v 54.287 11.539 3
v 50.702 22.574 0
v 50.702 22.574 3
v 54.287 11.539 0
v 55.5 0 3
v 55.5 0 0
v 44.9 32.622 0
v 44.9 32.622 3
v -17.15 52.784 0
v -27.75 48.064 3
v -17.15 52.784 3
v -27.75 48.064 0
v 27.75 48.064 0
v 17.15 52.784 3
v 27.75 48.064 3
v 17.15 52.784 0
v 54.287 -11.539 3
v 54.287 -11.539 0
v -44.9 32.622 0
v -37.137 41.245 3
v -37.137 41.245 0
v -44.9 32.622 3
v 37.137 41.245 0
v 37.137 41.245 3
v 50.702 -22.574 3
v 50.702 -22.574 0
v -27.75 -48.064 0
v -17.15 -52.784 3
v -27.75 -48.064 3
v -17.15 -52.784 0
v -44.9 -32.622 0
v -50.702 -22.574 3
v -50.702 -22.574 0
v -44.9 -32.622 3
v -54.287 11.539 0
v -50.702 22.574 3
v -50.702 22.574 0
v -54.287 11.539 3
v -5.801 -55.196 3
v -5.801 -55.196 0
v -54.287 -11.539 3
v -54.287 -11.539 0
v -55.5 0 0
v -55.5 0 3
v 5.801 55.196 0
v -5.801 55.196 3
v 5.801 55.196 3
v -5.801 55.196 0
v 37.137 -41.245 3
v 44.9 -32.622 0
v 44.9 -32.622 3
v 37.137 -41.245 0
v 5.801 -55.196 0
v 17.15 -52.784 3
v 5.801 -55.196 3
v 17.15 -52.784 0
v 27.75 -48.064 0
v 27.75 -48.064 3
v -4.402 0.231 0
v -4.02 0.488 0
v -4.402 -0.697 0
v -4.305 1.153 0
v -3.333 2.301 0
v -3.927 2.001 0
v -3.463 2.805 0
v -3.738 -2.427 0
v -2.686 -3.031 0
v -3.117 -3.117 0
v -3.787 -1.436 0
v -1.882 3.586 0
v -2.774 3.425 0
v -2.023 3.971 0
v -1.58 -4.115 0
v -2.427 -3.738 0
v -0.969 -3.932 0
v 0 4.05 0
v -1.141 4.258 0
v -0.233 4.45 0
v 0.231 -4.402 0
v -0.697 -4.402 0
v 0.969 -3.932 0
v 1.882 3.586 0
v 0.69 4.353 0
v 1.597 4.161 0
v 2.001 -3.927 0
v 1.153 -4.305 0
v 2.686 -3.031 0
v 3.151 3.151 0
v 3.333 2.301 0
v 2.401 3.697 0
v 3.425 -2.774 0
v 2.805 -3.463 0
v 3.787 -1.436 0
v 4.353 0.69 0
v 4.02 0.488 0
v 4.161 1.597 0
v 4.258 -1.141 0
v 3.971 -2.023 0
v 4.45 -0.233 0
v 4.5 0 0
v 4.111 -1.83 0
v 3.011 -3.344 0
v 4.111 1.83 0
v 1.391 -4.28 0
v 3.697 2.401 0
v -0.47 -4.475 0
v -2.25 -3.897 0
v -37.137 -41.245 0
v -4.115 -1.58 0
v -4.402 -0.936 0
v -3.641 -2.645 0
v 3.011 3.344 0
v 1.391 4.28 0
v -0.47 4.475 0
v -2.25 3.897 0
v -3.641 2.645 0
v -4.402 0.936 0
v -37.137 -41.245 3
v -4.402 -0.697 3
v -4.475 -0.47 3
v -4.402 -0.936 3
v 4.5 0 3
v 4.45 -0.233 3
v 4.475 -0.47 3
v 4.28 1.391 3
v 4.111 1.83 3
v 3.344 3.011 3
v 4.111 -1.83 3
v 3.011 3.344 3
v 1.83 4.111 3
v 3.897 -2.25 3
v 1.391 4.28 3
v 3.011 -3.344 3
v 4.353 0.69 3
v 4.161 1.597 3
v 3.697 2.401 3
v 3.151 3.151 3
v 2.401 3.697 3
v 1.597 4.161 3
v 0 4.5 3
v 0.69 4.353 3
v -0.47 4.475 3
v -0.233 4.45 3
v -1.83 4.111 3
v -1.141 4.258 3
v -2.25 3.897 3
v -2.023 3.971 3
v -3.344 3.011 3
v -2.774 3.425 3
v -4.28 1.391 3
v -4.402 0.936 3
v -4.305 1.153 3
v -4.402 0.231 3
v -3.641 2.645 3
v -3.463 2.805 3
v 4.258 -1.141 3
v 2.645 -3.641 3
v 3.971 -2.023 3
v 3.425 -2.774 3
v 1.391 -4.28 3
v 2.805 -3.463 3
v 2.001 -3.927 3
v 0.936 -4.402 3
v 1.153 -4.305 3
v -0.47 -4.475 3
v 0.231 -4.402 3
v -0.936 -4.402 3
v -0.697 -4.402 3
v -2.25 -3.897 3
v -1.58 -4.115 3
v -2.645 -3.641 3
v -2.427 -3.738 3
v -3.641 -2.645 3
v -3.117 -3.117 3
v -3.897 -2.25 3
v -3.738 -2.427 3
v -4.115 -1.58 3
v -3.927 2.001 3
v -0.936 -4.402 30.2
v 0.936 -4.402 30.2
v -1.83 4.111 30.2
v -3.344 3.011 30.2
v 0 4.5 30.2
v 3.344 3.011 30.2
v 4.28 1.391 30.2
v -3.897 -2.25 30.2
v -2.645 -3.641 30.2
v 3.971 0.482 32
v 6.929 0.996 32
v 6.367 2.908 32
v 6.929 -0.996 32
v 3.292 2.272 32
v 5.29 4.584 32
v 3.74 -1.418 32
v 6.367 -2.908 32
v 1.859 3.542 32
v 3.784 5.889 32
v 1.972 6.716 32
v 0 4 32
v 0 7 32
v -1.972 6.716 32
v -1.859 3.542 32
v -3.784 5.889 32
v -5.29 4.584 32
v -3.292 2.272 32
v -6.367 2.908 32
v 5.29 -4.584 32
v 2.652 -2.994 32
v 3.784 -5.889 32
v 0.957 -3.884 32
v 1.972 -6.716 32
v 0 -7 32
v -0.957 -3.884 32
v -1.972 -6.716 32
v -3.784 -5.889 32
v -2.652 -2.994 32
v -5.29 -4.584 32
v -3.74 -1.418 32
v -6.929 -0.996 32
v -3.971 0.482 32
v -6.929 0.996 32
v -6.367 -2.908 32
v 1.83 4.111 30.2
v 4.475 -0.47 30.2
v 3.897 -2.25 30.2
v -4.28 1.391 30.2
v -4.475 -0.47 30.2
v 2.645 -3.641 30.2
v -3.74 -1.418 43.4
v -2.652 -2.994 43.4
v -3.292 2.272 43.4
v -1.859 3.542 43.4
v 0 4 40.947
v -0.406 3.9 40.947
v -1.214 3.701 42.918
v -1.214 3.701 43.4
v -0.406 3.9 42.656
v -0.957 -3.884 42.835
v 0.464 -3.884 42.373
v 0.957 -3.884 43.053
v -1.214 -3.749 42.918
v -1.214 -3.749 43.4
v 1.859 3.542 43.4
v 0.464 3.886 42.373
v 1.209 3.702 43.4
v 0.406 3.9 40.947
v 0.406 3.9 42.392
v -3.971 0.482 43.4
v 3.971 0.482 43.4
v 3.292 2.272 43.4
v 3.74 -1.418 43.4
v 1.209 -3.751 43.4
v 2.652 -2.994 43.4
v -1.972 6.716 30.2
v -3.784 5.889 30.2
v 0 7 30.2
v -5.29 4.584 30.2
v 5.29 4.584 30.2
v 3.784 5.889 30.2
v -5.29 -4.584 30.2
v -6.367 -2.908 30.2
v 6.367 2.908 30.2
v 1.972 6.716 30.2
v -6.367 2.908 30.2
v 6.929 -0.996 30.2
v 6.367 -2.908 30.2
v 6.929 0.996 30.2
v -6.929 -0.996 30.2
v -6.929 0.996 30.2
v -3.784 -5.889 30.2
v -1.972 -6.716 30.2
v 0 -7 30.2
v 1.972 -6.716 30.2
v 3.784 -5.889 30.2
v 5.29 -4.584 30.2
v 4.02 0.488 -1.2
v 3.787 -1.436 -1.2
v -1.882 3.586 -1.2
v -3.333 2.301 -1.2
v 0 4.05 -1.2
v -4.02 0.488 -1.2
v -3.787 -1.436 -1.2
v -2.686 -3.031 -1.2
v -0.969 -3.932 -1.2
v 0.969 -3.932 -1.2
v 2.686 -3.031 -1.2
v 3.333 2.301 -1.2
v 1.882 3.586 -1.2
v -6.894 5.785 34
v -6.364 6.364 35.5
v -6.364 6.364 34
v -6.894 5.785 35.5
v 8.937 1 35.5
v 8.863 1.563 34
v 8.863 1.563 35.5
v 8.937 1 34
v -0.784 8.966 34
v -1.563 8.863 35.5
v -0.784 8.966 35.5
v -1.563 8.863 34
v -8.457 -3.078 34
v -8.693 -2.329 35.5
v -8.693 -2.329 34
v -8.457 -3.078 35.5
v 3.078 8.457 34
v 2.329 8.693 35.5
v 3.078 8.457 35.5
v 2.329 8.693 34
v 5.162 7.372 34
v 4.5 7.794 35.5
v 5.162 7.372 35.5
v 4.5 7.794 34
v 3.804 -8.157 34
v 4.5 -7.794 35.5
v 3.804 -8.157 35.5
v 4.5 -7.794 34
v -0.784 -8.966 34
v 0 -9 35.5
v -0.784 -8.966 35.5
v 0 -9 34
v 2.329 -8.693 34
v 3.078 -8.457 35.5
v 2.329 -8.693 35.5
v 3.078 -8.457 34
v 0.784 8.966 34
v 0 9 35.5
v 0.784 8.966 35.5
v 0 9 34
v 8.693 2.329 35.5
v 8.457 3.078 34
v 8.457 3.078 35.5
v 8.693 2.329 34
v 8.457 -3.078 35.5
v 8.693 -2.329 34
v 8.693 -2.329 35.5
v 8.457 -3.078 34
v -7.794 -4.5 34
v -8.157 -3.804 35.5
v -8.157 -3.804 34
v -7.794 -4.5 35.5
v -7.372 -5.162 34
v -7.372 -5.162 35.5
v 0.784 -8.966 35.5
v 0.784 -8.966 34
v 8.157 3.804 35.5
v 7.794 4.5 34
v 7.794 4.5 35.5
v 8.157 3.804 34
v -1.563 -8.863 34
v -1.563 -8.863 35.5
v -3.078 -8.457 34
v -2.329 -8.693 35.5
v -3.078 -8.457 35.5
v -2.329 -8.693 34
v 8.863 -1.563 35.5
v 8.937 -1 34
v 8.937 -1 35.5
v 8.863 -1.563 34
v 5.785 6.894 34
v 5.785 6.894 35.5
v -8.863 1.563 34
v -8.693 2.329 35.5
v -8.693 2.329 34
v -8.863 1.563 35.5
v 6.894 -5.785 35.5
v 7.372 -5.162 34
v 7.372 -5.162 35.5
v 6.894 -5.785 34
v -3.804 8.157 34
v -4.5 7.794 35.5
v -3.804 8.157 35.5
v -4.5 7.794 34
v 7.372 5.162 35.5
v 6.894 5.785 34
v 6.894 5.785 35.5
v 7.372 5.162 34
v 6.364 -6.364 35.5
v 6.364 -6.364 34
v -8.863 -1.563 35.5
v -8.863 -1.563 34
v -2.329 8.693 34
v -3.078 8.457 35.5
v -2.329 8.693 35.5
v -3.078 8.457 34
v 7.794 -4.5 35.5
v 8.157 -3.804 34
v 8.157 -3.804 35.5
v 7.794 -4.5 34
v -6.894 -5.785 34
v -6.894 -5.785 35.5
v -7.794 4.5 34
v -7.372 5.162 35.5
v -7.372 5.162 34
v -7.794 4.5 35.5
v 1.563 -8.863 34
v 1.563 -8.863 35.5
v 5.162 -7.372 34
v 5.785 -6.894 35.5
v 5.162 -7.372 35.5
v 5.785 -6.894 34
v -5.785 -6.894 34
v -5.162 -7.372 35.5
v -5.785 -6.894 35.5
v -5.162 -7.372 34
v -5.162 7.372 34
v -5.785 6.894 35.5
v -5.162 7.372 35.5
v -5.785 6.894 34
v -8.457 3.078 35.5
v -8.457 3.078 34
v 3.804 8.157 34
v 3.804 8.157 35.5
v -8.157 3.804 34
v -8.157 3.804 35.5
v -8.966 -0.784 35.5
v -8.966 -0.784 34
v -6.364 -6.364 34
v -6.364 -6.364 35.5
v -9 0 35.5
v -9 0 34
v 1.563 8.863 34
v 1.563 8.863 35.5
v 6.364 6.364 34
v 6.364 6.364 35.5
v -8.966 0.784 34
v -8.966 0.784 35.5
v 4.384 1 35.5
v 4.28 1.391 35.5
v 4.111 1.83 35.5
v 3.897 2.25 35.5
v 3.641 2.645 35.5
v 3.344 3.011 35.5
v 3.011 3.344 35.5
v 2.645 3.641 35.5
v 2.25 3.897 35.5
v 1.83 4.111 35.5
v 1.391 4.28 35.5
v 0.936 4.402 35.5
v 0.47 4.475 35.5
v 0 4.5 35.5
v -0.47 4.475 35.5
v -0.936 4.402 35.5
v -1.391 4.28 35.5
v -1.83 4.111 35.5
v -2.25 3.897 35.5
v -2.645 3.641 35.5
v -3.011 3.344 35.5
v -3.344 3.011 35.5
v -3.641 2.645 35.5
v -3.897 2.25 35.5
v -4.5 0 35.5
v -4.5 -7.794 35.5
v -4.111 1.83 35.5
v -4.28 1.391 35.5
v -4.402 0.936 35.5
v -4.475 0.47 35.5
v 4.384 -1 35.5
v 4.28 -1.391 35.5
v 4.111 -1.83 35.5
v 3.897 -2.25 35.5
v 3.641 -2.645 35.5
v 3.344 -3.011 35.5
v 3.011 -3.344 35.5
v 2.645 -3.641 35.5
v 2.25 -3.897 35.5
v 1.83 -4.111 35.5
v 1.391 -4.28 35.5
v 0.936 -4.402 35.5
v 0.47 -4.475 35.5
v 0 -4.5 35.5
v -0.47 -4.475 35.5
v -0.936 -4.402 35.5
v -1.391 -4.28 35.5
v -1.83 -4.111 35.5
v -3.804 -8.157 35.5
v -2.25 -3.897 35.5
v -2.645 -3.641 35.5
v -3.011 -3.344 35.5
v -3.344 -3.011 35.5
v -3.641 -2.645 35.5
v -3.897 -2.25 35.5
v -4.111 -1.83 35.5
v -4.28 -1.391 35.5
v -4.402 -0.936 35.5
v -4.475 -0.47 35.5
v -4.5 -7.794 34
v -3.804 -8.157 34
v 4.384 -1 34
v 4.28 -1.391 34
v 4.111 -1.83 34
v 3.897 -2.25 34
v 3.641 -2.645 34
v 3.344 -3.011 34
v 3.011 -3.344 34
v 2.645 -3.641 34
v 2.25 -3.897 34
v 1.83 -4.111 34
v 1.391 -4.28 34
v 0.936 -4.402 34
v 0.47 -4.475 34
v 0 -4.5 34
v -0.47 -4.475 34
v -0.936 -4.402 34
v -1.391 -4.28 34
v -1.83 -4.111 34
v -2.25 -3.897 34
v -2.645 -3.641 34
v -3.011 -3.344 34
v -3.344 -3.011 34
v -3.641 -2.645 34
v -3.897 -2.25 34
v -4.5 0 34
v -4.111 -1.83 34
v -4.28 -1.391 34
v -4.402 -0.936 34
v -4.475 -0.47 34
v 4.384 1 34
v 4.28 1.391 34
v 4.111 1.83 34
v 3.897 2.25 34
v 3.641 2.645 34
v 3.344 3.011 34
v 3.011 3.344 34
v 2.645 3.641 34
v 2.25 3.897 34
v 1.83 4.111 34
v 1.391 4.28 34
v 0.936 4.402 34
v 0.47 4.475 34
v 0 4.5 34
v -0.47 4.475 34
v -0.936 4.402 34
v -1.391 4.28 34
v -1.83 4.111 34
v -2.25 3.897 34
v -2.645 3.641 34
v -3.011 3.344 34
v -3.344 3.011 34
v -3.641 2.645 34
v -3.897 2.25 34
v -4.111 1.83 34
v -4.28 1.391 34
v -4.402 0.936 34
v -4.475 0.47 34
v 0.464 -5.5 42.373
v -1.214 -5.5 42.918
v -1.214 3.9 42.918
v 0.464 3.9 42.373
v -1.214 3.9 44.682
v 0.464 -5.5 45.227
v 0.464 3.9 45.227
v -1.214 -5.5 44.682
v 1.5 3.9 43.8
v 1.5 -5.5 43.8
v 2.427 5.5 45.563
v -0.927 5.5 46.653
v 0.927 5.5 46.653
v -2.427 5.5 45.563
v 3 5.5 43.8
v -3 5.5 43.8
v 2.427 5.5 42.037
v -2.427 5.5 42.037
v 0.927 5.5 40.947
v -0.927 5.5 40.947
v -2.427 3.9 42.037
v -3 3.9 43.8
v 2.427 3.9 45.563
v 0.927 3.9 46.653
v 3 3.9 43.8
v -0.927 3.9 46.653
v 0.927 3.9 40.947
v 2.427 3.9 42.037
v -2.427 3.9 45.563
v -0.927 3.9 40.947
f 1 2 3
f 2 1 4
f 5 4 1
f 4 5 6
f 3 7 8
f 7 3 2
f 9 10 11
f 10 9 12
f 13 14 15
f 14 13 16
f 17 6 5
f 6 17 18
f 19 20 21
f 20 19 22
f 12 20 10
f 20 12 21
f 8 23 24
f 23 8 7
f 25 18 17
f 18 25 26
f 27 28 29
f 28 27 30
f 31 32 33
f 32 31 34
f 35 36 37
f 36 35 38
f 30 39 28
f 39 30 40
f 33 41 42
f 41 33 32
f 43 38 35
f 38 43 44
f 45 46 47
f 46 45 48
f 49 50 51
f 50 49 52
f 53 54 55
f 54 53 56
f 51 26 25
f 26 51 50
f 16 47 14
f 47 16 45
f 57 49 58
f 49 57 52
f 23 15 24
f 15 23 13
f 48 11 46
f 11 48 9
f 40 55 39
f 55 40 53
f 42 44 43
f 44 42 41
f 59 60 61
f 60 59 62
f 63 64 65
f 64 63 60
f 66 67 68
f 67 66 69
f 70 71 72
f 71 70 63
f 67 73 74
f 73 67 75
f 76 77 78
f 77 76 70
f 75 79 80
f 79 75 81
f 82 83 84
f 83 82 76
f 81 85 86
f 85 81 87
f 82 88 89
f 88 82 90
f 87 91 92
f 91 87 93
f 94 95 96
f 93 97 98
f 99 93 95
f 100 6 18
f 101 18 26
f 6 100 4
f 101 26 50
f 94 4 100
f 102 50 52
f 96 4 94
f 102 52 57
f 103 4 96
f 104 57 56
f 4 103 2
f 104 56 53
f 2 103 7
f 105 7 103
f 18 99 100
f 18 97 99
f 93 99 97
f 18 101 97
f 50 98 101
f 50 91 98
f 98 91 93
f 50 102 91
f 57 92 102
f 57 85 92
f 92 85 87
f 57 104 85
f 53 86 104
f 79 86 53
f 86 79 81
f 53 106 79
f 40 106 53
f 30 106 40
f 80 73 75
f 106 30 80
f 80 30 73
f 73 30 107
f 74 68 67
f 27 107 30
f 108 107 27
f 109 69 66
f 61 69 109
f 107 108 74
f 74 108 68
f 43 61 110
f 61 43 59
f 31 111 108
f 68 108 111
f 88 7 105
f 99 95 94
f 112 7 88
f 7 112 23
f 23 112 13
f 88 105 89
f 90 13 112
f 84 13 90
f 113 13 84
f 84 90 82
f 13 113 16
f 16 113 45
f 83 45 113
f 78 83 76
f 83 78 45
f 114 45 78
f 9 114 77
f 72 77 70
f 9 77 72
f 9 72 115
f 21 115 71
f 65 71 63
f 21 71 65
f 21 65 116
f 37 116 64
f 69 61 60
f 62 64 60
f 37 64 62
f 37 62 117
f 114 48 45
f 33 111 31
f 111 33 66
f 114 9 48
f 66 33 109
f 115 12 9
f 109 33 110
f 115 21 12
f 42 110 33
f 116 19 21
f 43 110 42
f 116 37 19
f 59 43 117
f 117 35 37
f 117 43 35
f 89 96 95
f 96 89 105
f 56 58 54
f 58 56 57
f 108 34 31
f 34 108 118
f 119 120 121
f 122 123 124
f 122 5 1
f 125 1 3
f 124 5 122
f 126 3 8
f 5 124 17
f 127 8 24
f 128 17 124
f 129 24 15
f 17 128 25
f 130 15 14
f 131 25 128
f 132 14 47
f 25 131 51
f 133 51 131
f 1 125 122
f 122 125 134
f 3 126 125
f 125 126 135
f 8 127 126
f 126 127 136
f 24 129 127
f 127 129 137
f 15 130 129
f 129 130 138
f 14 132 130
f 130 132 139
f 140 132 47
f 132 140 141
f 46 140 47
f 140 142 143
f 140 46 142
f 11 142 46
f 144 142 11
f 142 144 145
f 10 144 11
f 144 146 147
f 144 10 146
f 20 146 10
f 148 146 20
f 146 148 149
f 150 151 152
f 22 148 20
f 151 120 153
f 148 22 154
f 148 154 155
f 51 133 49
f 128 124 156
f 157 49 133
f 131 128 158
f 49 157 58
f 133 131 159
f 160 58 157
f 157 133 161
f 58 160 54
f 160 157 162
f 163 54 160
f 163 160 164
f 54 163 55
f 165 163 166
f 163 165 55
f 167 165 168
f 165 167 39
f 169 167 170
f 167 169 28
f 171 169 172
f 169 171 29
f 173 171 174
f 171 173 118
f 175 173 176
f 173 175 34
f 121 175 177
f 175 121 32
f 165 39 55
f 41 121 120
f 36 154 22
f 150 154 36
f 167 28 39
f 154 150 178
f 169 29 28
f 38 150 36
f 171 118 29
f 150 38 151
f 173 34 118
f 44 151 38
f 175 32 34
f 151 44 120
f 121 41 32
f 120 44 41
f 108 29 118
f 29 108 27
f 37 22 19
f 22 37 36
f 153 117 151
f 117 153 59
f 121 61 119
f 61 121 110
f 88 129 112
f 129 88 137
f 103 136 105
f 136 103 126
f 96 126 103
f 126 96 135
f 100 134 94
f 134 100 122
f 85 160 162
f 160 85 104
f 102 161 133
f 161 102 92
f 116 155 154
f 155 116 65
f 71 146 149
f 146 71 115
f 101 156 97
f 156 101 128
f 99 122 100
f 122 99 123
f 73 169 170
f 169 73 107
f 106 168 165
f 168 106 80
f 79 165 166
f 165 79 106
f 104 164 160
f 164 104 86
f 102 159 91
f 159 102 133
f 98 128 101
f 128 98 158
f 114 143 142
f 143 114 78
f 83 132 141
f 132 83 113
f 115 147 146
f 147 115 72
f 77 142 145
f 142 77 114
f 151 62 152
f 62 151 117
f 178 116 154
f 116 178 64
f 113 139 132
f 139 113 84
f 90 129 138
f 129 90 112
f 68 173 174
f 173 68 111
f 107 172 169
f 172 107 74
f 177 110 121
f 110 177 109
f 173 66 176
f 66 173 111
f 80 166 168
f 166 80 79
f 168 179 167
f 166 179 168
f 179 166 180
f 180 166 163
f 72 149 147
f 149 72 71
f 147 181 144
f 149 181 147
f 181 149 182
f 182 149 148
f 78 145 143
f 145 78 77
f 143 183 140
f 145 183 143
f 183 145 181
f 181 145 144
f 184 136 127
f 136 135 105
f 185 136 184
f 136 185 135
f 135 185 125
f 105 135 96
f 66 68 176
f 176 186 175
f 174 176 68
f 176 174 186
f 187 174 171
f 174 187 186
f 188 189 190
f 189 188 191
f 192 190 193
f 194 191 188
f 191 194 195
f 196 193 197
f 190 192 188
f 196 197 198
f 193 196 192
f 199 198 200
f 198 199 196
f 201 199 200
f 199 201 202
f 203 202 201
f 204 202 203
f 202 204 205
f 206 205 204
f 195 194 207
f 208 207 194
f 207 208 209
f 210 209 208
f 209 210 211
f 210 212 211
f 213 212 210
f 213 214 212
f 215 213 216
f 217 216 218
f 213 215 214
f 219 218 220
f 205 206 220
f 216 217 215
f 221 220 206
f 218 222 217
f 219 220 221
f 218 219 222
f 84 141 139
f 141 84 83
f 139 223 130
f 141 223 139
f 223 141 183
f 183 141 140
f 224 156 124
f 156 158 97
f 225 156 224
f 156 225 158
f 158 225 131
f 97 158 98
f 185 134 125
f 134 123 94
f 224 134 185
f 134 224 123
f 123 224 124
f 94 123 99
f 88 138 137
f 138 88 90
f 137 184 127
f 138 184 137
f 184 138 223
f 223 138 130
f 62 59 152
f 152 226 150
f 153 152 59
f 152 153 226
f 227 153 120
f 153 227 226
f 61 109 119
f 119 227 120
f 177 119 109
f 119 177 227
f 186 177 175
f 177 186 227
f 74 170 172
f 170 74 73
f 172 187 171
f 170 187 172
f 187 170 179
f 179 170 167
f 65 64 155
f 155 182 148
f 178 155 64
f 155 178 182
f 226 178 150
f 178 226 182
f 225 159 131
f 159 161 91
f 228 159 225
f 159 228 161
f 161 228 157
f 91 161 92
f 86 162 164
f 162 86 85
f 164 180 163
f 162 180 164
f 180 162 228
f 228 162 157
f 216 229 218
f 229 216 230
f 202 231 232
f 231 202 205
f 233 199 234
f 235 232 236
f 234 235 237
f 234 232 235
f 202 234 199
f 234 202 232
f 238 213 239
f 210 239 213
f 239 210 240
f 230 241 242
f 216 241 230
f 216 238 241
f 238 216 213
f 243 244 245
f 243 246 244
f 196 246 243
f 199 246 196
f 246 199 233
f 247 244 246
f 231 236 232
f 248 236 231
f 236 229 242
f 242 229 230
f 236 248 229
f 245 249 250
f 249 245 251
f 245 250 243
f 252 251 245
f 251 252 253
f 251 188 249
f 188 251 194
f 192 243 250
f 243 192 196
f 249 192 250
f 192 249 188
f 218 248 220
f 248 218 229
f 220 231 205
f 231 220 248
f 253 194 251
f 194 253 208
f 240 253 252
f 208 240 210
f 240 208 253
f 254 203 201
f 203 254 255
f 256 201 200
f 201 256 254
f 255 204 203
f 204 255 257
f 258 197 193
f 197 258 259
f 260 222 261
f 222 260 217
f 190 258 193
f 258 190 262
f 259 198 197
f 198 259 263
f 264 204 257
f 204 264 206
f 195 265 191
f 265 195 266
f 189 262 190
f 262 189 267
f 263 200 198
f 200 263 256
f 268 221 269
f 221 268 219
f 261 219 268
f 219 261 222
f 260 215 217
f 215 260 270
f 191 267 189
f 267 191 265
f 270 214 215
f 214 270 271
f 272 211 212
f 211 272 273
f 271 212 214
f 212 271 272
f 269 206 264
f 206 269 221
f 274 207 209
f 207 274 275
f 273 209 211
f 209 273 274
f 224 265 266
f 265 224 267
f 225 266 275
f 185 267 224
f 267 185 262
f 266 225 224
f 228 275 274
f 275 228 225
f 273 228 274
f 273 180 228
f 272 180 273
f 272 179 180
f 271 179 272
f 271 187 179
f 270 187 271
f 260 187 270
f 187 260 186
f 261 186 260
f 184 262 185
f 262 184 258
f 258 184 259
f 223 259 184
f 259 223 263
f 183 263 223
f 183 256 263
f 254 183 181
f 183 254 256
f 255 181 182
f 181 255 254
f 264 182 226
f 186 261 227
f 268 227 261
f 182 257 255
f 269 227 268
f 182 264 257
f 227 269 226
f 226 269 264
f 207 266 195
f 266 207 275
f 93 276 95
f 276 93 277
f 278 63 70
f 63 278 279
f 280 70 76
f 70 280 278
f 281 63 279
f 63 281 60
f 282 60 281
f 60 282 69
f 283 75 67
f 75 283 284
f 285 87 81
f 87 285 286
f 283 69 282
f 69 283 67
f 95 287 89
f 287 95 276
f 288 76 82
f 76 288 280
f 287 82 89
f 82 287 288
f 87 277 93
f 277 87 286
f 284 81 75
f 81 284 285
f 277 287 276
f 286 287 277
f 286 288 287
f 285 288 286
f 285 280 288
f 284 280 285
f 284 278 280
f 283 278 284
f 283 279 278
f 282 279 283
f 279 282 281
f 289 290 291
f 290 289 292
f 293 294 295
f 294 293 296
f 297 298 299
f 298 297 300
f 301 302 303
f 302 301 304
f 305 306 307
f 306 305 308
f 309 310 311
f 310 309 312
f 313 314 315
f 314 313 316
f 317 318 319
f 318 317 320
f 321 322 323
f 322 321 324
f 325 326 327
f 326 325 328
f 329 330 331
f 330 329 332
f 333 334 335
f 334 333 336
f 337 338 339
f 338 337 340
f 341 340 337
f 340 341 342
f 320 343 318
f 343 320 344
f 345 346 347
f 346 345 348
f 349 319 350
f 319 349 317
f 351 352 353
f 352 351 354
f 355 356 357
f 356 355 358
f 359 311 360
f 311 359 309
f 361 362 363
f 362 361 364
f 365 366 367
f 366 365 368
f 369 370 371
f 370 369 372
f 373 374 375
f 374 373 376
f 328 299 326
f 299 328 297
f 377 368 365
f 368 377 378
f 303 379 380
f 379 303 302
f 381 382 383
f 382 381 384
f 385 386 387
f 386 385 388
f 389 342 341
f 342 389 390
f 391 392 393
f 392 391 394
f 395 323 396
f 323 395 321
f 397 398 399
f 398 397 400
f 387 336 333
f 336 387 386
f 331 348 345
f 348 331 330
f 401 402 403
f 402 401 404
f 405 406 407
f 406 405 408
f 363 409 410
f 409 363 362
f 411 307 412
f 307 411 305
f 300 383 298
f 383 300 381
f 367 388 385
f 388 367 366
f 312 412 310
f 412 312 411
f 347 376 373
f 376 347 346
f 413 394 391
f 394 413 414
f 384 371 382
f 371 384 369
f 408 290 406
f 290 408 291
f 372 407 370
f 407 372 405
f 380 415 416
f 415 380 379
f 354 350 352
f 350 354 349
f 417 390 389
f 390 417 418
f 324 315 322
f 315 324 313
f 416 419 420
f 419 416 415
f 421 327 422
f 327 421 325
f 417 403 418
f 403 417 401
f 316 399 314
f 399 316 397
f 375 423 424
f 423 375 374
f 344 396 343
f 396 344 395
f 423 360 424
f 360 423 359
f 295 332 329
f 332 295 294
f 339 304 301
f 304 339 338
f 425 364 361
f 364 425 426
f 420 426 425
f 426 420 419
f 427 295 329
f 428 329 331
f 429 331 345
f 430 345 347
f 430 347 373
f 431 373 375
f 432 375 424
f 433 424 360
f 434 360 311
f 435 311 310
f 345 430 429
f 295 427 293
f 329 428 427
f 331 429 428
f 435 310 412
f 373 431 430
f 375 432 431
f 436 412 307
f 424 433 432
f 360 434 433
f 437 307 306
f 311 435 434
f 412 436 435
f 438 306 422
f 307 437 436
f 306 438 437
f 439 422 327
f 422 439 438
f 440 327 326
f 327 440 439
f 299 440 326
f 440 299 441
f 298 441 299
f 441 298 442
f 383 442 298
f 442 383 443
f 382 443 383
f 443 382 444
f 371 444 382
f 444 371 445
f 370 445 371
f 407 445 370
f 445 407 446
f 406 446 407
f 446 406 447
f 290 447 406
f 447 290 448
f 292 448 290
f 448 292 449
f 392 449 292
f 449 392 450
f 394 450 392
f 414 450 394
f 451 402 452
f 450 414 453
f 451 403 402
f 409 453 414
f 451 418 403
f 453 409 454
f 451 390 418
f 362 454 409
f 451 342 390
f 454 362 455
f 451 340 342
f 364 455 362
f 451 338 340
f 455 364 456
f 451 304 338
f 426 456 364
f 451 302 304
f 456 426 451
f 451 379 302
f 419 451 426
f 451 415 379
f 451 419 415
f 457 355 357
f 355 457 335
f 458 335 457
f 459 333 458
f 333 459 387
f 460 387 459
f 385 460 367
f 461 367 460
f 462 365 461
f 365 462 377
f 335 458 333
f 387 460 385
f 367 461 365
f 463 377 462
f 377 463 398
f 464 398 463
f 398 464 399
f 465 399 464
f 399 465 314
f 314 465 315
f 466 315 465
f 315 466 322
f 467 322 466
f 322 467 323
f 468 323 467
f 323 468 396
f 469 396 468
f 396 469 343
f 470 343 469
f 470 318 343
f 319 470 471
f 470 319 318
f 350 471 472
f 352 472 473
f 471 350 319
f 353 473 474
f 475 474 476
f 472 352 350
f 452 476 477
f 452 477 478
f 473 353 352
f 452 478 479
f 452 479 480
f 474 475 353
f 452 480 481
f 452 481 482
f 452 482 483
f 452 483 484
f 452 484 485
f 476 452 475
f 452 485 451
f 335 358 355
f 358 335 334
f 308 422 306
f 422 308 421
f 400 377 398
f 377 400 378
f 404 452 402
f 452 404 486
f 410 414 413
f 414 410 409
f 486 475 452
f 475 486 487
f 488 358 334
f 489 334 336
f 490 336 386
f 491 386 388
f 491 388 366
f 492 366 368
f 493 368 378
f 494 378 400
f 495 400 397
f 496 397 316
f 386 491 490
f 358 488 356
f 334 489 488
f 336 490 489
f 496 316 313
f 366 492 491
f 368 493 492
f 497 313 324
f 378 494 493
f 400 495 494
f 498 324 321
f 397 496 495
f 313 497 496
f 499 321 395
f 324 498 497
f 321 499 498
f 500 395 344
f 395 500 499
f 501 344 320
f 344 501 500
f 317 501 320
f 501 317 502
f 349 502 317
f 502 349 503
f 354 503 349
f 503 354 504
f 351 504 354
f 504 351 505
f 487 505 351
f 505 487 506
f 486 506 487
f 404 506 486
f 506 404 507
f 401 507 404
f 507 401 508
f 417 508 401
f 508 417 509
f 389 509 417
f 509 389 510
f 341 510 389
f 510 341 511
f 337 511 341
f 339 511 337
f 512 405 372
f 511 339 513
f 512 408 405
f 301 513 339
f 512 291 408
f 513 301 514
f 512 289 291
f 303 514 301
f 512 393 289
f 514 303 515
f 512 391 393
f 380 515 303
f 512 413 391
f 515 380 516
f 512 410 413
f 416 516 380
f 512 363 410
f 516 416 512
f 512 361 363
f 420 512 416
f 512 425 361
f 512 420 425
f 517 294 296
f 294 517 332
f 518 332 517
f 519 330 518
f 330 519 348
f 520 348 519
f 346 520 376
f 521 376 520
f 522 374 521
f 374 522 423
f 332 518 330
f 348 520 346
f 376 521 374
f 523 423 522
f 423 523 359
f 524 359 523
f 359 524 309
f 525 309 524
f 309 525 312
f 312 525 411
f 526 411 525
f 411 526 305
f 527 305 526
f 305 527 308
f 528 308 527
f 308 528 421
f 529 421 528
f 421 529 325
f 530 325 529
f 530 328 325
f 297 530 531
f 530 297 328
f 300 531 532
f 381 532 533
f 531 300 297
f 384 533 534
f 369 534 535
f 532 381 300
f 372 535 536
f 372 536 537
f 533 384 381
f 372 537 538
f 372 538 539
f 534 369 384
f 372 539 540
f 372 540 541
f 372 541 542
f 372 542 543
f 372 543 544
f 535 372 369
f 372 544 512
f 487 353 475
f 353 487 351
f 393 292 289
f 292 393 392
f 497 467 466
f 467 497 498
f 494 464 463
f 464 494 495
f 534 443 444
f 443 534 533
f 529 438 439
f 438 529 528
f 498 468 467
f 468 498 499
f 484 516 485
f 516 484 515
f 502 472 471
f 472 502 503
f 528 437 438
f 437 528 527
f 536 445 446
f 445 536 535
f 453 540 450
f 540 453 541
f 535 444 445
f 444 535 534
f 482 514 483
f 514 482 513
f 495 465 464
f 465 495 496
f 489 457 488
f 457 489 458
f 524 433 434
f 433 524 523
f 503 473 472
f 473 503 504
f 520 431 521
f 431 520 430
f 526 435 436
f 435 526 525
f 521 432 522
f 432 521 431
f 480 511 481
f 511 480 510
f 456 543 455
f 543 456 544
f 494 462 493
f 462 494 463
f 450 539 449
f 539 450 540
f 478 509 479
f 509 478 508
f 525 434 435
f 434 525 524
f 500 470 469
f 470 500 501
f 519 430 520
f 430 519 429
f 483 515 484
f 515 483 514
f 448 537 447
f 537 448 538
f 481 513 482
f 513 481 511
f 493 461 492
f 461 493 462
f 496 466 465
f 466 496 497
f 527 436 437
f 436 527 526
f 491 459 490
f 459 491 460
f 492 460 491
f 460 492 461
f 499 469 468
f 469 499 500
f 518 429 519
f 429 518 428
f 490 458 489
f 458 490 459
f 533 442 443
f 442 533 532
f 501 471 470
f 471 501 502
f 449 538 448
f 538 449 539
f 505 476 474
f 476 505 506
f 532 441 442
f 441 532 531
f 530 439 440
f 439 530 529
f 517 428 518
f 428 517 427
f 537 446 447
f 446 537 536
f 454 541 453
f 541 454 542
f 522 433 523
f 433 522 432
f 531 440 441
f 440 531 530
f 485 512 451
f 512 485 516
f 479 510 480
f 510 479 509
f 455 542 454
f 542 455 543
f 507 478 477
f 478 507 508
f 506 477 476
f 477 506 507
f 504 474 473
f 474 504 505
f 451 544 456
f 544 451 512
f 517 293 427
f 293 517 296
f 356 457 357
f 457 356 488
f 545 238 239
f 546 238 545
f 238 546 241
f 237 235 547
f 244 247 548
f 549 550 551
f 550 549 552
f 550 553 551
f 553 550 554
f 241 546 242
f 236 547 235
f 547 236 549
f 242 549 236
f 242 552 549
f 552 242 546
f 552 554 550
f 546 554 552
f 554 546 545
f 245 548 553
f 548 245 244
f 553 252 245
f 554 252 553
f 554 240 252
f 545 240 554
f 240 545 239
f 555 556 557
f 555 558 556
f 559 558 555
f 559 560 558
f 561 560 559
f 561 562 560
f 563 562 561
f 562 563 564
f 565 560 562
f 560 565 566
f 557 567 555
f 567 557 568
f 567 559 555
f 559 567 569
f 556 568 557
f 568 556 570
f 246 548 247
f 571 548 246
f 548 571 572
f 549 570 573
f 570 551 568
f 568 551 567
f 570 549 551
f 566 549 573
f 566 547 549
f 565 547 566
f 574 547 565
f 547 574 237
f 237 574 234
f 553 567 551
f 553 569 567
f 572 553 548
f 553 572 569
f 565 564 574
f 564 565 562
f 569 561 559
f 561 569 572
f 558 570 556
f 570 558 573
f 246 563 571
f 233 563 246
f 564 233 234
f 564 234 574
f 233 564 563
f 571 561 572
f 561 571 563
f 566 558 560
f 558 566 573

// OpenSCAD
// file: ../parts/a11_gear_lock.scad
// part_id: a11
// name: A11 gear lock (b1 Gear Lock)
// source_drawing_ids: DRW-001
// units: mm
// revision: 0.1-placeholder
// SPDX-License-Identifier: MIT
//
// Lock ring that secures b1 on the central axle.
// Geometry is approximate – no dedicated detail drawing available.

module part_a11(od = 18.0, id = 9.0, th = 1.5, gap_w = 2.0) {
    difference() {
        cylinder(d = od, h = th, center = false, $fn = 72);
        translate([0, 0, -0.1]) cylinder(d = id, h = th + 0.2, center = false, $fn = 60);
        // Split gap (c-clip style).
        translate([0, -gap_w / 2, -0.1]) cube([od / 2 + 1, gap_w, th + 0.2], center = false);
    }
}


// ---- "main guard" ----
if (is_undef(__LIB_MODE__)) {
    part_a11();
}
// file: ../parts/a10_disc.scad
// part_id: a10
// name: A10 disc
// source_drawing_ids: DRW-001
// units: mm
// revision: 0.1-placeholder
// SPDX-License-Identifier: MIT

module a10_center_slot(slot_l = 4.2, slot_w = 1.6, pin_d = 3.0) {
    hull() {
        translate([ slot_l / 2, 0]) circle(d = slot_w, $fn = 32);
        translate([-slot_l / 2, 0]) circle(d = slot_w, $fn = 32);
    }
    circle(d = pin_d, $fn = 36);
}

module part_a10(od = 111, th = 2, center_hole_d = 9) {
    difference() {
        cylinder(d = od, h = th, center = false);
        translate([0, 0, -0.1]) cylinder(d = center_hole_d, h = th + 0.2, center = false);
        translate([0, 0, -0.1]) linear_extrude(height = th + 0.2) a10_center_slot();
    }
}
// file: ../parts/a9_axle.scad
// part_id: a9
// name: A9 axle
// source_drawing_ids: DRW-001
// units: mm
// revision: 0.1-placeholder
// SPDX-License-Identifier: MIT

module part_a9(body_d = 9, body_h = 32, upper_d = 8, upper_h = 11.4, shoulder_d = 14, shoulder_h = 1.8) {
    union() {
        cylinder(d = body_d, h = body_h, center = false);
        translate([0, 0, body_h]) cylinder(d = upper_d, h = upper_h, center = false);
        translate([0, 0, body_h - shoulder_h]) cylinder(d = shoulder_d, h = shoulder_h, center = false);
        translate([0, 0, -1.2]) cylinder(d = body_d * 0.9, h = 1.2, center = false);
    }
}
// file: ../parts/a8_rivet_pin.scad
// part_id: a8
// name: A8 rivet pin
// source_drawing_ids: DRW-001
// units: mm
// revision: 0.1-placeholder
// SPDX-License-Identifier: MIT

module part_a8(pin_d = 3, pin_h = 11, head_d = 6, head_h = 1.6) {
    union() {
        cylinder(d = pin_d, h = pin_h, center = false);
        cylinder(d = head_d, h = head_h, center = false);
    }
}


// ---- "main guard" ----
// Default to previewing when opened directly:
if (is_undef(__LIB_MODE__)) {
    part_a8();
}
// main file
// DRW-001 reusable A8 subassembly (a8, a9, a10, a11).
// Centered on the main axle axis at origin for reuse in sheet scenes.
// SPDX-License-Identifier: MIT

use <../parts/a8_rivet_pin.scad>
use <../parts/a9_axle.scad>
use <../parts/a10_disc.scad>
use <../parts/a11_gear_lock.scad>

module drw001_a8_subassembly(
    a10_th = 3.0,
    a11_z = 34.0,
    // A8 pin inserted through A9 top cross-hole.
    a8_hole_z = 43.8
) {
    // Main disc (A10), centered on Z=0 plane for easy placement.
    color([0.45, 0.30, 0.18])
        translate([0, 0, 0])
            part_a10(th = a10_th);

    // Axle (A9) through/above disc.
    color([0.52, 0.43, 0.34])
        rotate([0, 0, 90])
            part_a9();

    // Lock ring (A11) on axle.
    color([0.25, 0.25, 0.25])
        translate([0, 0, a11_z])
            part_a11();

    // One A8 pin inserted into the top hole of A9.
    color([0.25, 0.25, 0.25])
        translate([0, 11/2, a8_hole_z])
            rotate([90, 0, 0])
                part_a8();
}


// ---- "main guard" ----
if (is_undef(__LIB_MODE__)) {
    drw001_a8_subassembly();
}
